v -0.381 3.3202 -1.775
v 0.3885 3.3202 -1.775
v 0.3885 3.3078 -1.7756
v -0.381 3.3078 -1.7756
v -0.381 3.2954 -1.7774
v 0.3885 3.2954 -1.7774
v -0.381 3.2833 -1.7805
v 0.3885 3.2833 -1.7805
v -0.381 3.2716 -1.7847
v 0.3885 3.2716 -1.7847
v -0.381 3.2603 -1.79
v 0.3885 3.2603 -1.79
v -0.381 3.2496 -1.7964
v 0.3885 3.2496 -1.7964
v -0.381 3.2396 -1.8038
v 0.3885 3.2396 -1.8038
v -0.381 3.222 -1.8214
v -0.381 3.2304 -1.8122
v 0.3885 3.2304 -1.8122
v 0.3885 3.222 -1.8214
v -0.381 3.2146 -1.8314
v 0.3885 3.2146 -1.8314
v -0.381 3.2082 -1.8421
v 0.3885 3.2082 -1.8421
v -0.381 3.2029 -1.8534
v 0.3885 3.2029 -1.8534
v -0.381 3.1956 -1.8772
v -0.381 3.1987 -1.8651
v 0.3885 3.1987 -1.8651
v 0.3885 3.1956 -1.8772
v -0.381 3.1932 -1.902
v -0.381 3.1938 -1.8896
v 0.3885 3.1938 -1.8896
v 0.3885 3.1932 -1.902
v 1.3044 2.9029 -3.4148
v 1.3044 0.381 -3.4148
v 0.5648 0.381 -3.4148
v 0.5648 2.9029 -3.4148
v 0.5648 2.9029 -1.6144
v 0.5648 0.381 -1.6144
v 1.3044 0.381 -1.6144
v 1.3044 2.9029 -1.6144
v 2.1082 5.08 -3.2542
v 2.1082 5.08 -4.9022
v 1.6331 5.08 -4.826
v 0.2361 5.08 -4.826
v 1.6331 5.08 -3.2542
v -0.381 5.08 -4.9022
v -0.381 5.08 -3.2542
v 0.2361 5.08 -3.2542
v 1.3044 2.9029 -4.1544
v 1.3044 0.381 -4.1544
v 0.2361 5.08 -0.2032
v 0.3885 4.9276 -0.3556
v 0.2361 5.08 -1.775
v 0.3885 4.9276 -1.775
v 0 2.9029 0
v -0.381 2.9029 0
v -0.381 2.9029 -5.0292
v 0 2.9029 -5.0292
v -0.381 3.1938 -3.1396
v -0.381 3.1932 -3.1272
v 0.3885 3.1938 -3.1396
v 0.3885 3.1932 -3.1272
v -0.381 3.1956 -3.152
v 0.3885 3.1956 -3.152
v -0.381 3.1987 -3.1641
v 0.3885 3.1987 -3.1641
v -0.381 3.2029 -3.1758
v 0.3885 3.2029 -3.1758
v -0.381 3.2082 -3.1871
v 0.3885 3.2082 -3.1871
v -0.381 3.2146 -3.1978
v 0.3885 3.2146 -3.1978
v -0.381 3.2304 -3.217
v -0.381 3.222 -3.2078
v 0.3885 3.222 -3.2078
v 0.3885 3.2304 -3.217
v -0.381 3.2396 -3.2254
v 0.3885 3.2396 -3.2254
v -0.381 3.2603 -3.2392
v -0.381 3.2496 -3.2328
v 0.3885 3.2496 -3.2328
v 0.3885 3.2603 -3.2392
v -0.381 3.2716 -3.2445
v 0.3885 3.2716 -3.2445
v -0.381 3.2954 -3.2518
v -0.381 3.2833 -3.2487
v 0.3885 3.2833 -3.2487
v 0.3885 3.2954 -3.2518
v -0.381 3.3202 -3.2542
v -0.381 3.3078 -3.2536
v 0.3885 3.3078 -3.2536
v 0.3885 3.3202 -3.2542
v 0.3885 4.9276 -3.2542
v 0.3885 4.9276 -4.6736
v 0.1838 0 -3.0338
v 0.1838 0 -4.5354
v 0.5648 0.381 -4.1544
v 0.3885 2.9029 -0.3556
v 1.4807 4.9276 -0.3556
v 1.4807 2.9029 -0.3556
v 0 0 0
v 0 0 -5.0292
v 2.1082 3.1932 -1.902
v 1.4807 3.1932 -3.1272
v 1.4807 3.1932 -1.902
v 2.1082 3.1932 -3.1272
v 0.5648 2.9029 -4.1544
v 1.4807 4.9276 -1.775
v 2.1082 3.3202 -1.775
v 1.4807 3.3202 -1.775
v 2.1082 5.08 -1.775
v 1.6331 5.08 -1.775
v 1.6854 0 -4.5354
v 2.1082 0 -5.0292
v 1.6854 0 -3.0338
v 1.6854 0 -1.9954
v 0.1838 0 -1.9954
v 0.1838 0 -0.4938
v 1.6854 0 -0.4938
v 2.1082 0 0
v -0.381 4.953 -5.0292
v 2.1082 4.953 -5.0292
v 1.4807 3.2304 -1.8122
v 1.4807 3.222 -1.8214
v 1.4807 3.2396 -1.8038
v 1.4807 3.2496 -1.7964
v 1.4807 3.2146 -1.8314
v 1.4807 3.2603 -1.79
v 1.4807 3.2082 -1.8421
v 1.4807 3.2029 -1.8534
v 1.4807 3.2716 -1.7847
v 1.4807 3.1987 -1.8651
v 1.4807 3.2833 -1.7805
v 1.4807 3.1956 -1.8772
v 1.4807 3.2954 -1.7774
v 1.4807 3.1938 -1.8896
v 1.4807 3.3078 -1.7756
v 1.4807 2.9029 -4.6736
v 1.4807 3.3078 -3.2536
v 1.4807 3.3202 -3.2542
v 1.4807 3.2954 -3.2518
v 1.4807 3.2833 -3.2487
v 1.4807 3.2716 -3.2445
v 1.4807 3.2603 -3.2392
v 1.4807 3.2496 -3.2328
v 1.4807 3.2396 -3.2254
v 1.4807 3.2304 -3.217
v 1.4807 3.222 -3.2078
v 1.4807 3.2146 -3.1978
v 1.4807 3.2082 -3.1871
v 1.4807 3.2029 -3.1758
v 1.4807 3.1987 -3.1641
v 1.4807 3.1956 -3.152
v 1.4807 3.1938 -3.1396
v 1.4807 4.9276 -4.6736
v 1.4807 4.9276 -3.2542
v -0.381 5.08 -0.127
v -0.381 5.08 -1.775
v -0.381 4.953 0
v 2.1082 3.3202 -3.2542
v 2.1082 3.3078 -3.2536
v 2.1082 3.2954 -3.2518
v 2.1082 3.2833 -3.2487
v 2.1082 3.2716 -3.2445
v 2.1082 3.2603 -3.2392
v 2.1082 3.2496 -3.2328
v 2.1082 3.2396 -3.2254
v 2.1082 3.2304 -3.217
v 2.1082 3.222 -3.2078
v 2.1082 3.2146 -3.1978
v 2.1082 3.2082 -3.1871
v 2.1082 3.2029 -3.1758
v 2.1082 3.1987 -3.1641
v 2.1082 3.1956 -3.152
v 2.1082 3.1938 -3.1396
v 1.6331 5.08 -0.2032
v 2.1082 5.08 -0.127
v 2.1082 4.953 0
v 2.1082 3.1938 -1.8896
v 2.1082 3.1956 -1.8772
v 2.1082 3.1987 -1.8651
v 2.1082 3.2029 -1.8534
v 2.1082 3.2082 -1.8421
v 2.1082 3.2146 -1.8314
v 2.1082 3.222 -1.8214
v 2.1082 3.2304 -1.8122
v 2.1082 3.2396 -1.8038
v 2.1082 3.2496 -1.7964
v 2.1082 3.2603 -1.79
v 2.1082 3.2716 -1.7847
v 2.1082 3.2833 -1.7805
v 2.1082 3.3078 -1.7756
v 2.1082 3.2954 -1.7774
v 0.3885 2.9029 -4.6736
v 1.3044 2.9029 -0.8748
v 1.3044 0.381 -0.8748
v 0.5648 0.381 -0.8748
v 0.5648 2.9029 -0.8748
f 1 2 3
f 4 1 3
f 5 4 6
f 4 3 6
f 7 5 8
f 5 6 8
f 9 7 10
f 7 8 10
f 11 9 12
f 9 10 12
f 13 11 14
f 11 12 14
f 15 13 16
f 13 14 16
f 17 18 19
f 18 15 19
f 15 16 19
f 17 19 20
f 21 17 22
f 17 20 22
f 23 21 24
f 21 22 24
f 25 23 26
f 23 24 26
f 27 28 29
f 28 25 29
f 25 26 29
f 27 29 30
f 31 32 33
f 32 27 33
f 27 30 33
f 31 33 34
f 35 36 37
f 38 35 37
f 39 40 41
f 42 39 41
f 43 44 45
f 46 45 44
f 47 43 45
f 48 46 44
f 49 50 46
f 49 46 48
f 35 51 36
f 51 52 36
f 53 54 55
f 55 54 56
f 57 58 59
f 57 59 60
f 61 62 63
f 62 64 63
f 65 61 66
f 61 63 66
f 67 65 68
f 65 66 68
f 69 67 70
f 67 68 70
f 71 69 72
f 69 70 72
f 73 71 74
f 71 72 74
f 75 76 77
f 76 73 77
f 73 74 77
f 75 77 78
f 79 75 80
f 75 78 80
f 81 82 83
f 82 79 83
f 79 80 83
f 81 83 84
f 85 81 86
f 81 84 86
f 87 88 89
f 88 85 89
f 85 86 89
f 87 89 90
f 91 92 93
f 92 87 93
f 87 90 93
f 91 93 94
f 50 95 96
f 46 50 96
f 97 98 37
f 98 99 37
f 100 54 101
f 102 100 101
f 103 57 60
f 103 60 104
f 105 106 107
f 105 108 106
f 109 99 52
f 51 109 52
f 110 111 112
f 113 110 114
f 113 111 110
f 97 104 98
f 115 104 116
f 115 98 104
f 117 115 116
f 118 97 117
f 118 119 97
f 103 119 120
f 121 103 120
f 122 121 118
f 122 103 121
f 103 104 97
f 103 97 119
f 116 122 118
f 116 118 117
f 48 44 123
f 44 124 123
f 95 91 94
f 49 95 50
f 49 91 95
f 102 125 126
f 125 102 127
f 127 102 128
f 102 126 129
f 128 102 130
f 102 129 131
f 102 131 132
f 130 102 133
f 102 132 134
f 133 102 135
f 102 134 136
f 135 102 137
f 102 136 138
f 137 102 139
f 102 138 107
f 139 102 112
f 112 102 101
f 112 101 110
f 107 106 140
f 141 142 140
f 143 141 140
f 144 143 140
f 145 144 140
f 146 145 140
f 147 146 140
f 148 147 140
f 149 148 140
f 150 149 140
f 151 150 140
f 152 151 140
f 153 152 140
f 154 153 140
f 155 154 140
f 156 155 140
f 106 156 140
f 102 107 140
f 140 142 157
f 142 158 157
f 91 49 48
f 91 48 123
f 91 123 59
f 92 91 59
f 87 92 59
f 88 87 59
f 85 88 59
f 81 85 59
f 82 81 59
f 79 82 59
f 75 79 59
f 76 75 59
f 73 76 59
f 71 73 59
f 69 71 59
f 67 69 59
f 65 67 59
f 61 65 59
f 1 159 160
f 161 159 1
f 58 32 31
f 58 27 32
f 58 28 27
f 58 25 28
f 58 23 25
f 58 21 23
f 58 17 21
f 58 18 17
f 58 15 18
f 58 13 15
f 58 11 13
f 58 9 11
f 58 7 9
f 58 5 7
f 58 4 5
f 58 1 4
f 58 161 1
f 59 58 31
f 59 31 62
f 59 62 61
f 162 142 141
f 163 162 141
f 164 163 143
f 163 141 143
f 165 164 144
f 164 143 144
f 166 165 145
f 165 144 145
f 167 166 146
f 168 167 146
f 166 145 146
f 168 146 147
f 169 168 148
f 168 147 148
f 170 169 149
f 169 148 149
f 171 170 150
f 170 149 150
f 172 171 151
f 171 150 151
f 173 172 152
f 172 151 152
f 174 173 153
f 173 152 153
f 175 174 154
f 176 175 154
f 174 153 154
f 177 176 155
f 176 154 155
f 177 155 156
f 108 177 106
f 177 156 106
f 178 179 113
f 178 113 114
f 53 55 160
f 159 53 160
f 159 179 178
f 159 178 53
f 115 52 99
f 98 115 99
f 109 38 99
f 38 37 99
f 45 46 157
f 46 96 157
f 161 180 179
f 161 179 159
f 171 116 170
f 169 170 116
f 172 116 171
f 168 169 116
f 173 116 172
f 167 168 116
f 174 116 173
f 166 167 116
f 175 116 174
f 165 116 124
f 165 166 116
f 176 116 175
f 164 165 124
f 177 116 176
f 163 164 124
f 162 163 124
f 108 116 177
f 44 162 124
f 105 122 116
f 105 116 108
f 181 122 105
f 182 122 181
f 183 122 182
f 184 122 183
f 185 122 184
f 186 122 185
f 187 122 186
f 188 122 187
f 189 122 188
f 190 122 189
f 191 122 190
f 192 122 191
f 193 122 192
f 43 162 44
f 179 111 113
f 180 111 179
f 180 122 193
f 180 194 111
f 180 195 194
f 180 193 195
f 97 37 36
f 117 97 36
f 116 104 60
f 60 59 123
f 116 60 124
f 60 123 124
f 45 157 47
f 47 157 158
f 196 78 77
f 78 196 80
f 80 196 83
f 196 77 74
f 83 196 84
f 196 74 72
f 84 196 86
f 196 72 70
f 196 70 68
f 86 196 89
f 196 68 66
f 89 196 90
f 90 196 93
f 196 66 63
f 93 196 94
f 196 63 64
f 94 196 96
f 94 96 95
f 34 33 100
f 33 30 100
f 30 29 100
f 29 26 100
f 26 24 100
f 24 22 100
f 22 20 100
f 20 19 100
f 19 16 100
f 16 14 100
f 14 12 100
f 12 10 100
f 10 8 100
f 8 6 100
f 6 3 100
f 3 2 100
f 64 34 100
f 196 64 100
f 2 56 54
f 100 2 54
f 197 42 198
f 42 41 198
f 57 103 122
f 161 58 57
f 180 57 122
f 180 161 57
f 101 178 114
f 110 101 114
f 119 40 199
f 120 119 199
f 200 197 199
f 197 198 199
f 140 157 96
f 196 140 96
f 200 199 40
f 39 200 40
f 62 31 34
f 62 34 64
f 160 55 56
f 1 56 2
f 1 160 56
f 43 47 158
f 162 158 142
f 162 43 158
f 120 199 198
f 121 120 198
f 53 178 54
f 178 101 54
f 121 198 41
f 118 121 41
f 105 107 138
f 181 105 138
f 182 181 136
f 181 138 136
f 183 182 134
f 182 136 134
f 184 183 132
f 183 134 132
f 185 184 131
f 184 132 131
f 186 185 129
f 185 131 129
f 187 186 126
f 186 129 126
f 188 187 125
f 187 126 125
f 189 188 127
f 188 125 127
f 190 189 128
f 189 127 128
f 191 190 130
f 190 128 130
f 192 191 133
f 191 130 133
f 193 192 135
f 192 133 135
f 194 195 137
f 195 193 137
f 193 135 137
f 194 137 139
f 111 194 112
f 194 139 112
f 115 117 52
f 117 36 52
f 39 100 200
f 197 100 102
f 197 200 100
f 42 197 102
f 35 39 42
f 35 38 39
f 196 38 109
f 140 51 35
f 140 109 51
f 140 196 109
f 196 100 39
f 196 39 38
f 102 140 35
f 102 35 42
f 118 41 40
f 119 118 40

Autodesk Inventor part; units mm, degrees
ref_plane "YZ Plane" through (0, 0, 0) normal (1, 0, 0) x (0, 1, 0)
ref_plane "XZ Plane" through (0, 0, 0) normal (0, 1, 0) x (-1, 0, 0)
sketch "Sketch1" plane through (0, 0, 0) normal (0, 0, 1) x (1, 0, 0)
  line L0 (0, 0) -> (2.1082, 0)
  line L1 (2.1082, 0) -> (2.1082, 5.08)
  line L2 (2.1082, 5.08) -> (-0.381, 5.08)
  line L3 (-0.381, 5.08) -> (-0.381, 2.9029)
  line L4 (-0.381, 2.9029) -> (0, 2.9029)
  line L5 (0, 2.9029) -> (0, 0)
  dimension "d0" = 5.08
  dimension "d1" = 2.4892
  dimension "d2" = 2.1082
  dimension "d3" = 2.1771
extrude "Extrusion1" add sketch "Sketch1" against normal blind 5.0292
sketch "Sketch2" plane through (0, 0, 0) normal (0, -1, 0) x (1, 0, 0)
  line L0 (0, -5.0292) -> (2.1082, -5.0292) projected
  line L1 (2.1082, 0) -> (2.1082, -5.0292) projected
  line L2 (0, 0) -> (2.1082, 0) projected
  line L3 (1.6742, -4.5242) -> (0.195, -4.5242)
  line L4 (0.195, -4.5242) -> (0.195, -3.045)
  line L5 (0.195, -3.045) -> (1.6742, -3.045)
  line L6 (1.6742, -3.045) -> (1.6742, -4.5242)
  line L7 (1.6742, -1.9842) -> (0.195, -1.9842)
  line L8 (0.195, -1.9842) -> (0.195, -0.505)
  line L9 (0.195, -0.505) -> (1.6742, -0.505)
  line L10 (1.6742, -0.505) -> (1.6742, -1.9842)
  line L11 (1.6742, -3.7846) -> (0.195, -3.7846) construction
  line L12 (0.195, -1.2446) -> (1.6742, -1.2446) construction
  line L13 (0.9346, -4.5242) -> (0.9346, -3.045) construction
  line L14 (0.5648, -3.4148) -> (0.5648, -4.1544)
  line L15 (0.5648, -4.1544) -> (1.3044, -4.1544)
  line L16 (1.3044, -4.1544) -> (1.3044, -3.4148)
  line L17 (1.3044, -3.4148) -> (0.5648, -3.4148)
  line L18 (0.5648, -0.8748) -> (0.5648, -1.6144)
  line L19 (0.5648, -1.6144) -> (1.3044, -1.6144)
  line L20 (1.3044, -1.6144) -> (1.3044, -0.8748)
  line L21 (1.3044, -0.8748) -> (0.5648, -0.8748)
  dimension "d6" = 1.4792
  dimension "d7" = 1.4792
  dimension "d8" = 1.2446
  dimension "d9" = 1.2446
  dimension "d10" = 1.4792
  dimension "d11" = 0.434
  dimension "d12" = 0.7396
  dimension "d13" = 0.7396
extrude "Extrusion2" cut sketch "Sketch2" against normal through all contours L17 L16 L15 L14 | L21 L20 L19 L18
chamfer "Chamfer1" distance 0.381 angle 45 8 edges at (0.5648, 0, -3.7846) (0.9346, 0, -3.4148) (1.3044, 0, -3.7846) (0.9346, 0, -4.1544) (0.9346, 0, -1.6144) (0.5648, 0, -1.2446) (0.9346, 0, -0.8748) (1.3044, 0, -1.2446)
sketch "Sketch3" plane through (-0.381, 5.08, 0) normal (0, 1, 0) x (1, 0, 0)
  line L0 (0.9458, 1.6144) -> (1.6854, 1.6144) projected
  line L1 (1.6854, 1.6144) -> (1.6854, 0.8748) projected
  line L2 (1.6854, 0.8748) -> (0.9458, 0.8748) projected
  line L3 (0.9458, 0.8748) -> (0.9458, 1.6144) projected
  line L4 (0.9458, 4.1544) -> (1.6854, 4.1544) projected
  line L5 (1.6854, 4.1544) -> (1.6854, 3.4148) projected
  line L6 (1.6854, 3.4148) -> (0.9458, 3.4148) projected
  line L7 (0.9458, 3.4148) -> (0.9458, 4.1544) projected
  line L8 (0, 0) -> (0, 5.0292) projected
  line L9 (2.4892, 0) -> (0, 0) projected
  line L10 (2.4892, 0) -> (2.4892, 5.0292) projected
  line L11 (1.8617, 0.3556) -> (1.8617, 4.6736)
  line L12 (1.8617, 4.6736) -> (0.7695, 4.6736)
  line L13 (0.7695, 4.6736) -> (0.7695, 0.3556)
  line L14 (0.7695, 0.3556) -> (1.8617, 0.3556)
  point P0 (0.381, 0)
  point P1 (0.7695, 2.5146)
  point P2 (0, 2.5146)
  point P3 (1.3156, 0.3556)
  point P4 (1.2446, 0)
  point P5 (1.3156, 0.8748)
  point P6 (0, 2.5146)
  dimension "d32" = 4.318
  dimension "d33" = 1.0922
extrude "Extrusion3" cut sketch "Sketch3" against normal up to surface (2.1771 mm away)
sketch "Sketch4" plane through (-0.381, 2.9029, 0) normal (-1, 0, 0) x (0, 0, 1)
  line L0 (0, 2.1771) -> (-5.0292, 2.1771) projected
  line L1 (-3.2542, 2.1771) -> (-1.775, 2.1771)
  line L2 (-1.775, 2.1771) -> (-1.775, 0.2903)
  line L3 (-1.775, 0.2903) -> (-3.2542, 0.2903)
  line L4 (-3.2542, 0.2903) -> (-3.2542, 2.1771)
  point P0 (0, -2.9029)
  point P1 (-2.5146, 0.2903)
  point P2 (-2.5146, 2.1771)
  dimension "d24" = 1.4792
  dimension "d25" = 1.8869
extrude "Extrusion4" cut sketch "Sketch4" against normal up to next
fillet "Fillet1" radius 0.127 2 edges at (0.0037, 3.1931, -1.775) (0.0037, 3.1931, -3.2542)
chamfer "Chamfer2" distance 0.127 angle 45 2 edges at (0.8636, 5.08, -5.0292) (0.8636, 5.08, 0)
ref_plane "Work Plane1" through (0.8636, 2.9029, -5.0292) normal (-1, 0, 0) x (0, 0, 1)
mirror "Mirror1" about plane through (0.8636, 2.9029, -5.0292) normal (-1, 0, 0) of "Extrusion4", "Fillet1"
chamfer "Chamfer3" distance 0.1524 angle 45 6 edges at (0.9346, 5.08, -0.3556) (0.3885, 5.08, -1.0653) (0.3885, 5.08, -3.9639) (0.9346, 5.08, -4.6736) (1.4807, 5.08, -3.9639) (1.4807, 5.08, -1.0653)
equation "\"d7\" = d6"
equation "\"d9\" = d8"
equation "\"d10\" = d6"
equation "\"d13\" = d12"
properties part number "68786-102LF"
